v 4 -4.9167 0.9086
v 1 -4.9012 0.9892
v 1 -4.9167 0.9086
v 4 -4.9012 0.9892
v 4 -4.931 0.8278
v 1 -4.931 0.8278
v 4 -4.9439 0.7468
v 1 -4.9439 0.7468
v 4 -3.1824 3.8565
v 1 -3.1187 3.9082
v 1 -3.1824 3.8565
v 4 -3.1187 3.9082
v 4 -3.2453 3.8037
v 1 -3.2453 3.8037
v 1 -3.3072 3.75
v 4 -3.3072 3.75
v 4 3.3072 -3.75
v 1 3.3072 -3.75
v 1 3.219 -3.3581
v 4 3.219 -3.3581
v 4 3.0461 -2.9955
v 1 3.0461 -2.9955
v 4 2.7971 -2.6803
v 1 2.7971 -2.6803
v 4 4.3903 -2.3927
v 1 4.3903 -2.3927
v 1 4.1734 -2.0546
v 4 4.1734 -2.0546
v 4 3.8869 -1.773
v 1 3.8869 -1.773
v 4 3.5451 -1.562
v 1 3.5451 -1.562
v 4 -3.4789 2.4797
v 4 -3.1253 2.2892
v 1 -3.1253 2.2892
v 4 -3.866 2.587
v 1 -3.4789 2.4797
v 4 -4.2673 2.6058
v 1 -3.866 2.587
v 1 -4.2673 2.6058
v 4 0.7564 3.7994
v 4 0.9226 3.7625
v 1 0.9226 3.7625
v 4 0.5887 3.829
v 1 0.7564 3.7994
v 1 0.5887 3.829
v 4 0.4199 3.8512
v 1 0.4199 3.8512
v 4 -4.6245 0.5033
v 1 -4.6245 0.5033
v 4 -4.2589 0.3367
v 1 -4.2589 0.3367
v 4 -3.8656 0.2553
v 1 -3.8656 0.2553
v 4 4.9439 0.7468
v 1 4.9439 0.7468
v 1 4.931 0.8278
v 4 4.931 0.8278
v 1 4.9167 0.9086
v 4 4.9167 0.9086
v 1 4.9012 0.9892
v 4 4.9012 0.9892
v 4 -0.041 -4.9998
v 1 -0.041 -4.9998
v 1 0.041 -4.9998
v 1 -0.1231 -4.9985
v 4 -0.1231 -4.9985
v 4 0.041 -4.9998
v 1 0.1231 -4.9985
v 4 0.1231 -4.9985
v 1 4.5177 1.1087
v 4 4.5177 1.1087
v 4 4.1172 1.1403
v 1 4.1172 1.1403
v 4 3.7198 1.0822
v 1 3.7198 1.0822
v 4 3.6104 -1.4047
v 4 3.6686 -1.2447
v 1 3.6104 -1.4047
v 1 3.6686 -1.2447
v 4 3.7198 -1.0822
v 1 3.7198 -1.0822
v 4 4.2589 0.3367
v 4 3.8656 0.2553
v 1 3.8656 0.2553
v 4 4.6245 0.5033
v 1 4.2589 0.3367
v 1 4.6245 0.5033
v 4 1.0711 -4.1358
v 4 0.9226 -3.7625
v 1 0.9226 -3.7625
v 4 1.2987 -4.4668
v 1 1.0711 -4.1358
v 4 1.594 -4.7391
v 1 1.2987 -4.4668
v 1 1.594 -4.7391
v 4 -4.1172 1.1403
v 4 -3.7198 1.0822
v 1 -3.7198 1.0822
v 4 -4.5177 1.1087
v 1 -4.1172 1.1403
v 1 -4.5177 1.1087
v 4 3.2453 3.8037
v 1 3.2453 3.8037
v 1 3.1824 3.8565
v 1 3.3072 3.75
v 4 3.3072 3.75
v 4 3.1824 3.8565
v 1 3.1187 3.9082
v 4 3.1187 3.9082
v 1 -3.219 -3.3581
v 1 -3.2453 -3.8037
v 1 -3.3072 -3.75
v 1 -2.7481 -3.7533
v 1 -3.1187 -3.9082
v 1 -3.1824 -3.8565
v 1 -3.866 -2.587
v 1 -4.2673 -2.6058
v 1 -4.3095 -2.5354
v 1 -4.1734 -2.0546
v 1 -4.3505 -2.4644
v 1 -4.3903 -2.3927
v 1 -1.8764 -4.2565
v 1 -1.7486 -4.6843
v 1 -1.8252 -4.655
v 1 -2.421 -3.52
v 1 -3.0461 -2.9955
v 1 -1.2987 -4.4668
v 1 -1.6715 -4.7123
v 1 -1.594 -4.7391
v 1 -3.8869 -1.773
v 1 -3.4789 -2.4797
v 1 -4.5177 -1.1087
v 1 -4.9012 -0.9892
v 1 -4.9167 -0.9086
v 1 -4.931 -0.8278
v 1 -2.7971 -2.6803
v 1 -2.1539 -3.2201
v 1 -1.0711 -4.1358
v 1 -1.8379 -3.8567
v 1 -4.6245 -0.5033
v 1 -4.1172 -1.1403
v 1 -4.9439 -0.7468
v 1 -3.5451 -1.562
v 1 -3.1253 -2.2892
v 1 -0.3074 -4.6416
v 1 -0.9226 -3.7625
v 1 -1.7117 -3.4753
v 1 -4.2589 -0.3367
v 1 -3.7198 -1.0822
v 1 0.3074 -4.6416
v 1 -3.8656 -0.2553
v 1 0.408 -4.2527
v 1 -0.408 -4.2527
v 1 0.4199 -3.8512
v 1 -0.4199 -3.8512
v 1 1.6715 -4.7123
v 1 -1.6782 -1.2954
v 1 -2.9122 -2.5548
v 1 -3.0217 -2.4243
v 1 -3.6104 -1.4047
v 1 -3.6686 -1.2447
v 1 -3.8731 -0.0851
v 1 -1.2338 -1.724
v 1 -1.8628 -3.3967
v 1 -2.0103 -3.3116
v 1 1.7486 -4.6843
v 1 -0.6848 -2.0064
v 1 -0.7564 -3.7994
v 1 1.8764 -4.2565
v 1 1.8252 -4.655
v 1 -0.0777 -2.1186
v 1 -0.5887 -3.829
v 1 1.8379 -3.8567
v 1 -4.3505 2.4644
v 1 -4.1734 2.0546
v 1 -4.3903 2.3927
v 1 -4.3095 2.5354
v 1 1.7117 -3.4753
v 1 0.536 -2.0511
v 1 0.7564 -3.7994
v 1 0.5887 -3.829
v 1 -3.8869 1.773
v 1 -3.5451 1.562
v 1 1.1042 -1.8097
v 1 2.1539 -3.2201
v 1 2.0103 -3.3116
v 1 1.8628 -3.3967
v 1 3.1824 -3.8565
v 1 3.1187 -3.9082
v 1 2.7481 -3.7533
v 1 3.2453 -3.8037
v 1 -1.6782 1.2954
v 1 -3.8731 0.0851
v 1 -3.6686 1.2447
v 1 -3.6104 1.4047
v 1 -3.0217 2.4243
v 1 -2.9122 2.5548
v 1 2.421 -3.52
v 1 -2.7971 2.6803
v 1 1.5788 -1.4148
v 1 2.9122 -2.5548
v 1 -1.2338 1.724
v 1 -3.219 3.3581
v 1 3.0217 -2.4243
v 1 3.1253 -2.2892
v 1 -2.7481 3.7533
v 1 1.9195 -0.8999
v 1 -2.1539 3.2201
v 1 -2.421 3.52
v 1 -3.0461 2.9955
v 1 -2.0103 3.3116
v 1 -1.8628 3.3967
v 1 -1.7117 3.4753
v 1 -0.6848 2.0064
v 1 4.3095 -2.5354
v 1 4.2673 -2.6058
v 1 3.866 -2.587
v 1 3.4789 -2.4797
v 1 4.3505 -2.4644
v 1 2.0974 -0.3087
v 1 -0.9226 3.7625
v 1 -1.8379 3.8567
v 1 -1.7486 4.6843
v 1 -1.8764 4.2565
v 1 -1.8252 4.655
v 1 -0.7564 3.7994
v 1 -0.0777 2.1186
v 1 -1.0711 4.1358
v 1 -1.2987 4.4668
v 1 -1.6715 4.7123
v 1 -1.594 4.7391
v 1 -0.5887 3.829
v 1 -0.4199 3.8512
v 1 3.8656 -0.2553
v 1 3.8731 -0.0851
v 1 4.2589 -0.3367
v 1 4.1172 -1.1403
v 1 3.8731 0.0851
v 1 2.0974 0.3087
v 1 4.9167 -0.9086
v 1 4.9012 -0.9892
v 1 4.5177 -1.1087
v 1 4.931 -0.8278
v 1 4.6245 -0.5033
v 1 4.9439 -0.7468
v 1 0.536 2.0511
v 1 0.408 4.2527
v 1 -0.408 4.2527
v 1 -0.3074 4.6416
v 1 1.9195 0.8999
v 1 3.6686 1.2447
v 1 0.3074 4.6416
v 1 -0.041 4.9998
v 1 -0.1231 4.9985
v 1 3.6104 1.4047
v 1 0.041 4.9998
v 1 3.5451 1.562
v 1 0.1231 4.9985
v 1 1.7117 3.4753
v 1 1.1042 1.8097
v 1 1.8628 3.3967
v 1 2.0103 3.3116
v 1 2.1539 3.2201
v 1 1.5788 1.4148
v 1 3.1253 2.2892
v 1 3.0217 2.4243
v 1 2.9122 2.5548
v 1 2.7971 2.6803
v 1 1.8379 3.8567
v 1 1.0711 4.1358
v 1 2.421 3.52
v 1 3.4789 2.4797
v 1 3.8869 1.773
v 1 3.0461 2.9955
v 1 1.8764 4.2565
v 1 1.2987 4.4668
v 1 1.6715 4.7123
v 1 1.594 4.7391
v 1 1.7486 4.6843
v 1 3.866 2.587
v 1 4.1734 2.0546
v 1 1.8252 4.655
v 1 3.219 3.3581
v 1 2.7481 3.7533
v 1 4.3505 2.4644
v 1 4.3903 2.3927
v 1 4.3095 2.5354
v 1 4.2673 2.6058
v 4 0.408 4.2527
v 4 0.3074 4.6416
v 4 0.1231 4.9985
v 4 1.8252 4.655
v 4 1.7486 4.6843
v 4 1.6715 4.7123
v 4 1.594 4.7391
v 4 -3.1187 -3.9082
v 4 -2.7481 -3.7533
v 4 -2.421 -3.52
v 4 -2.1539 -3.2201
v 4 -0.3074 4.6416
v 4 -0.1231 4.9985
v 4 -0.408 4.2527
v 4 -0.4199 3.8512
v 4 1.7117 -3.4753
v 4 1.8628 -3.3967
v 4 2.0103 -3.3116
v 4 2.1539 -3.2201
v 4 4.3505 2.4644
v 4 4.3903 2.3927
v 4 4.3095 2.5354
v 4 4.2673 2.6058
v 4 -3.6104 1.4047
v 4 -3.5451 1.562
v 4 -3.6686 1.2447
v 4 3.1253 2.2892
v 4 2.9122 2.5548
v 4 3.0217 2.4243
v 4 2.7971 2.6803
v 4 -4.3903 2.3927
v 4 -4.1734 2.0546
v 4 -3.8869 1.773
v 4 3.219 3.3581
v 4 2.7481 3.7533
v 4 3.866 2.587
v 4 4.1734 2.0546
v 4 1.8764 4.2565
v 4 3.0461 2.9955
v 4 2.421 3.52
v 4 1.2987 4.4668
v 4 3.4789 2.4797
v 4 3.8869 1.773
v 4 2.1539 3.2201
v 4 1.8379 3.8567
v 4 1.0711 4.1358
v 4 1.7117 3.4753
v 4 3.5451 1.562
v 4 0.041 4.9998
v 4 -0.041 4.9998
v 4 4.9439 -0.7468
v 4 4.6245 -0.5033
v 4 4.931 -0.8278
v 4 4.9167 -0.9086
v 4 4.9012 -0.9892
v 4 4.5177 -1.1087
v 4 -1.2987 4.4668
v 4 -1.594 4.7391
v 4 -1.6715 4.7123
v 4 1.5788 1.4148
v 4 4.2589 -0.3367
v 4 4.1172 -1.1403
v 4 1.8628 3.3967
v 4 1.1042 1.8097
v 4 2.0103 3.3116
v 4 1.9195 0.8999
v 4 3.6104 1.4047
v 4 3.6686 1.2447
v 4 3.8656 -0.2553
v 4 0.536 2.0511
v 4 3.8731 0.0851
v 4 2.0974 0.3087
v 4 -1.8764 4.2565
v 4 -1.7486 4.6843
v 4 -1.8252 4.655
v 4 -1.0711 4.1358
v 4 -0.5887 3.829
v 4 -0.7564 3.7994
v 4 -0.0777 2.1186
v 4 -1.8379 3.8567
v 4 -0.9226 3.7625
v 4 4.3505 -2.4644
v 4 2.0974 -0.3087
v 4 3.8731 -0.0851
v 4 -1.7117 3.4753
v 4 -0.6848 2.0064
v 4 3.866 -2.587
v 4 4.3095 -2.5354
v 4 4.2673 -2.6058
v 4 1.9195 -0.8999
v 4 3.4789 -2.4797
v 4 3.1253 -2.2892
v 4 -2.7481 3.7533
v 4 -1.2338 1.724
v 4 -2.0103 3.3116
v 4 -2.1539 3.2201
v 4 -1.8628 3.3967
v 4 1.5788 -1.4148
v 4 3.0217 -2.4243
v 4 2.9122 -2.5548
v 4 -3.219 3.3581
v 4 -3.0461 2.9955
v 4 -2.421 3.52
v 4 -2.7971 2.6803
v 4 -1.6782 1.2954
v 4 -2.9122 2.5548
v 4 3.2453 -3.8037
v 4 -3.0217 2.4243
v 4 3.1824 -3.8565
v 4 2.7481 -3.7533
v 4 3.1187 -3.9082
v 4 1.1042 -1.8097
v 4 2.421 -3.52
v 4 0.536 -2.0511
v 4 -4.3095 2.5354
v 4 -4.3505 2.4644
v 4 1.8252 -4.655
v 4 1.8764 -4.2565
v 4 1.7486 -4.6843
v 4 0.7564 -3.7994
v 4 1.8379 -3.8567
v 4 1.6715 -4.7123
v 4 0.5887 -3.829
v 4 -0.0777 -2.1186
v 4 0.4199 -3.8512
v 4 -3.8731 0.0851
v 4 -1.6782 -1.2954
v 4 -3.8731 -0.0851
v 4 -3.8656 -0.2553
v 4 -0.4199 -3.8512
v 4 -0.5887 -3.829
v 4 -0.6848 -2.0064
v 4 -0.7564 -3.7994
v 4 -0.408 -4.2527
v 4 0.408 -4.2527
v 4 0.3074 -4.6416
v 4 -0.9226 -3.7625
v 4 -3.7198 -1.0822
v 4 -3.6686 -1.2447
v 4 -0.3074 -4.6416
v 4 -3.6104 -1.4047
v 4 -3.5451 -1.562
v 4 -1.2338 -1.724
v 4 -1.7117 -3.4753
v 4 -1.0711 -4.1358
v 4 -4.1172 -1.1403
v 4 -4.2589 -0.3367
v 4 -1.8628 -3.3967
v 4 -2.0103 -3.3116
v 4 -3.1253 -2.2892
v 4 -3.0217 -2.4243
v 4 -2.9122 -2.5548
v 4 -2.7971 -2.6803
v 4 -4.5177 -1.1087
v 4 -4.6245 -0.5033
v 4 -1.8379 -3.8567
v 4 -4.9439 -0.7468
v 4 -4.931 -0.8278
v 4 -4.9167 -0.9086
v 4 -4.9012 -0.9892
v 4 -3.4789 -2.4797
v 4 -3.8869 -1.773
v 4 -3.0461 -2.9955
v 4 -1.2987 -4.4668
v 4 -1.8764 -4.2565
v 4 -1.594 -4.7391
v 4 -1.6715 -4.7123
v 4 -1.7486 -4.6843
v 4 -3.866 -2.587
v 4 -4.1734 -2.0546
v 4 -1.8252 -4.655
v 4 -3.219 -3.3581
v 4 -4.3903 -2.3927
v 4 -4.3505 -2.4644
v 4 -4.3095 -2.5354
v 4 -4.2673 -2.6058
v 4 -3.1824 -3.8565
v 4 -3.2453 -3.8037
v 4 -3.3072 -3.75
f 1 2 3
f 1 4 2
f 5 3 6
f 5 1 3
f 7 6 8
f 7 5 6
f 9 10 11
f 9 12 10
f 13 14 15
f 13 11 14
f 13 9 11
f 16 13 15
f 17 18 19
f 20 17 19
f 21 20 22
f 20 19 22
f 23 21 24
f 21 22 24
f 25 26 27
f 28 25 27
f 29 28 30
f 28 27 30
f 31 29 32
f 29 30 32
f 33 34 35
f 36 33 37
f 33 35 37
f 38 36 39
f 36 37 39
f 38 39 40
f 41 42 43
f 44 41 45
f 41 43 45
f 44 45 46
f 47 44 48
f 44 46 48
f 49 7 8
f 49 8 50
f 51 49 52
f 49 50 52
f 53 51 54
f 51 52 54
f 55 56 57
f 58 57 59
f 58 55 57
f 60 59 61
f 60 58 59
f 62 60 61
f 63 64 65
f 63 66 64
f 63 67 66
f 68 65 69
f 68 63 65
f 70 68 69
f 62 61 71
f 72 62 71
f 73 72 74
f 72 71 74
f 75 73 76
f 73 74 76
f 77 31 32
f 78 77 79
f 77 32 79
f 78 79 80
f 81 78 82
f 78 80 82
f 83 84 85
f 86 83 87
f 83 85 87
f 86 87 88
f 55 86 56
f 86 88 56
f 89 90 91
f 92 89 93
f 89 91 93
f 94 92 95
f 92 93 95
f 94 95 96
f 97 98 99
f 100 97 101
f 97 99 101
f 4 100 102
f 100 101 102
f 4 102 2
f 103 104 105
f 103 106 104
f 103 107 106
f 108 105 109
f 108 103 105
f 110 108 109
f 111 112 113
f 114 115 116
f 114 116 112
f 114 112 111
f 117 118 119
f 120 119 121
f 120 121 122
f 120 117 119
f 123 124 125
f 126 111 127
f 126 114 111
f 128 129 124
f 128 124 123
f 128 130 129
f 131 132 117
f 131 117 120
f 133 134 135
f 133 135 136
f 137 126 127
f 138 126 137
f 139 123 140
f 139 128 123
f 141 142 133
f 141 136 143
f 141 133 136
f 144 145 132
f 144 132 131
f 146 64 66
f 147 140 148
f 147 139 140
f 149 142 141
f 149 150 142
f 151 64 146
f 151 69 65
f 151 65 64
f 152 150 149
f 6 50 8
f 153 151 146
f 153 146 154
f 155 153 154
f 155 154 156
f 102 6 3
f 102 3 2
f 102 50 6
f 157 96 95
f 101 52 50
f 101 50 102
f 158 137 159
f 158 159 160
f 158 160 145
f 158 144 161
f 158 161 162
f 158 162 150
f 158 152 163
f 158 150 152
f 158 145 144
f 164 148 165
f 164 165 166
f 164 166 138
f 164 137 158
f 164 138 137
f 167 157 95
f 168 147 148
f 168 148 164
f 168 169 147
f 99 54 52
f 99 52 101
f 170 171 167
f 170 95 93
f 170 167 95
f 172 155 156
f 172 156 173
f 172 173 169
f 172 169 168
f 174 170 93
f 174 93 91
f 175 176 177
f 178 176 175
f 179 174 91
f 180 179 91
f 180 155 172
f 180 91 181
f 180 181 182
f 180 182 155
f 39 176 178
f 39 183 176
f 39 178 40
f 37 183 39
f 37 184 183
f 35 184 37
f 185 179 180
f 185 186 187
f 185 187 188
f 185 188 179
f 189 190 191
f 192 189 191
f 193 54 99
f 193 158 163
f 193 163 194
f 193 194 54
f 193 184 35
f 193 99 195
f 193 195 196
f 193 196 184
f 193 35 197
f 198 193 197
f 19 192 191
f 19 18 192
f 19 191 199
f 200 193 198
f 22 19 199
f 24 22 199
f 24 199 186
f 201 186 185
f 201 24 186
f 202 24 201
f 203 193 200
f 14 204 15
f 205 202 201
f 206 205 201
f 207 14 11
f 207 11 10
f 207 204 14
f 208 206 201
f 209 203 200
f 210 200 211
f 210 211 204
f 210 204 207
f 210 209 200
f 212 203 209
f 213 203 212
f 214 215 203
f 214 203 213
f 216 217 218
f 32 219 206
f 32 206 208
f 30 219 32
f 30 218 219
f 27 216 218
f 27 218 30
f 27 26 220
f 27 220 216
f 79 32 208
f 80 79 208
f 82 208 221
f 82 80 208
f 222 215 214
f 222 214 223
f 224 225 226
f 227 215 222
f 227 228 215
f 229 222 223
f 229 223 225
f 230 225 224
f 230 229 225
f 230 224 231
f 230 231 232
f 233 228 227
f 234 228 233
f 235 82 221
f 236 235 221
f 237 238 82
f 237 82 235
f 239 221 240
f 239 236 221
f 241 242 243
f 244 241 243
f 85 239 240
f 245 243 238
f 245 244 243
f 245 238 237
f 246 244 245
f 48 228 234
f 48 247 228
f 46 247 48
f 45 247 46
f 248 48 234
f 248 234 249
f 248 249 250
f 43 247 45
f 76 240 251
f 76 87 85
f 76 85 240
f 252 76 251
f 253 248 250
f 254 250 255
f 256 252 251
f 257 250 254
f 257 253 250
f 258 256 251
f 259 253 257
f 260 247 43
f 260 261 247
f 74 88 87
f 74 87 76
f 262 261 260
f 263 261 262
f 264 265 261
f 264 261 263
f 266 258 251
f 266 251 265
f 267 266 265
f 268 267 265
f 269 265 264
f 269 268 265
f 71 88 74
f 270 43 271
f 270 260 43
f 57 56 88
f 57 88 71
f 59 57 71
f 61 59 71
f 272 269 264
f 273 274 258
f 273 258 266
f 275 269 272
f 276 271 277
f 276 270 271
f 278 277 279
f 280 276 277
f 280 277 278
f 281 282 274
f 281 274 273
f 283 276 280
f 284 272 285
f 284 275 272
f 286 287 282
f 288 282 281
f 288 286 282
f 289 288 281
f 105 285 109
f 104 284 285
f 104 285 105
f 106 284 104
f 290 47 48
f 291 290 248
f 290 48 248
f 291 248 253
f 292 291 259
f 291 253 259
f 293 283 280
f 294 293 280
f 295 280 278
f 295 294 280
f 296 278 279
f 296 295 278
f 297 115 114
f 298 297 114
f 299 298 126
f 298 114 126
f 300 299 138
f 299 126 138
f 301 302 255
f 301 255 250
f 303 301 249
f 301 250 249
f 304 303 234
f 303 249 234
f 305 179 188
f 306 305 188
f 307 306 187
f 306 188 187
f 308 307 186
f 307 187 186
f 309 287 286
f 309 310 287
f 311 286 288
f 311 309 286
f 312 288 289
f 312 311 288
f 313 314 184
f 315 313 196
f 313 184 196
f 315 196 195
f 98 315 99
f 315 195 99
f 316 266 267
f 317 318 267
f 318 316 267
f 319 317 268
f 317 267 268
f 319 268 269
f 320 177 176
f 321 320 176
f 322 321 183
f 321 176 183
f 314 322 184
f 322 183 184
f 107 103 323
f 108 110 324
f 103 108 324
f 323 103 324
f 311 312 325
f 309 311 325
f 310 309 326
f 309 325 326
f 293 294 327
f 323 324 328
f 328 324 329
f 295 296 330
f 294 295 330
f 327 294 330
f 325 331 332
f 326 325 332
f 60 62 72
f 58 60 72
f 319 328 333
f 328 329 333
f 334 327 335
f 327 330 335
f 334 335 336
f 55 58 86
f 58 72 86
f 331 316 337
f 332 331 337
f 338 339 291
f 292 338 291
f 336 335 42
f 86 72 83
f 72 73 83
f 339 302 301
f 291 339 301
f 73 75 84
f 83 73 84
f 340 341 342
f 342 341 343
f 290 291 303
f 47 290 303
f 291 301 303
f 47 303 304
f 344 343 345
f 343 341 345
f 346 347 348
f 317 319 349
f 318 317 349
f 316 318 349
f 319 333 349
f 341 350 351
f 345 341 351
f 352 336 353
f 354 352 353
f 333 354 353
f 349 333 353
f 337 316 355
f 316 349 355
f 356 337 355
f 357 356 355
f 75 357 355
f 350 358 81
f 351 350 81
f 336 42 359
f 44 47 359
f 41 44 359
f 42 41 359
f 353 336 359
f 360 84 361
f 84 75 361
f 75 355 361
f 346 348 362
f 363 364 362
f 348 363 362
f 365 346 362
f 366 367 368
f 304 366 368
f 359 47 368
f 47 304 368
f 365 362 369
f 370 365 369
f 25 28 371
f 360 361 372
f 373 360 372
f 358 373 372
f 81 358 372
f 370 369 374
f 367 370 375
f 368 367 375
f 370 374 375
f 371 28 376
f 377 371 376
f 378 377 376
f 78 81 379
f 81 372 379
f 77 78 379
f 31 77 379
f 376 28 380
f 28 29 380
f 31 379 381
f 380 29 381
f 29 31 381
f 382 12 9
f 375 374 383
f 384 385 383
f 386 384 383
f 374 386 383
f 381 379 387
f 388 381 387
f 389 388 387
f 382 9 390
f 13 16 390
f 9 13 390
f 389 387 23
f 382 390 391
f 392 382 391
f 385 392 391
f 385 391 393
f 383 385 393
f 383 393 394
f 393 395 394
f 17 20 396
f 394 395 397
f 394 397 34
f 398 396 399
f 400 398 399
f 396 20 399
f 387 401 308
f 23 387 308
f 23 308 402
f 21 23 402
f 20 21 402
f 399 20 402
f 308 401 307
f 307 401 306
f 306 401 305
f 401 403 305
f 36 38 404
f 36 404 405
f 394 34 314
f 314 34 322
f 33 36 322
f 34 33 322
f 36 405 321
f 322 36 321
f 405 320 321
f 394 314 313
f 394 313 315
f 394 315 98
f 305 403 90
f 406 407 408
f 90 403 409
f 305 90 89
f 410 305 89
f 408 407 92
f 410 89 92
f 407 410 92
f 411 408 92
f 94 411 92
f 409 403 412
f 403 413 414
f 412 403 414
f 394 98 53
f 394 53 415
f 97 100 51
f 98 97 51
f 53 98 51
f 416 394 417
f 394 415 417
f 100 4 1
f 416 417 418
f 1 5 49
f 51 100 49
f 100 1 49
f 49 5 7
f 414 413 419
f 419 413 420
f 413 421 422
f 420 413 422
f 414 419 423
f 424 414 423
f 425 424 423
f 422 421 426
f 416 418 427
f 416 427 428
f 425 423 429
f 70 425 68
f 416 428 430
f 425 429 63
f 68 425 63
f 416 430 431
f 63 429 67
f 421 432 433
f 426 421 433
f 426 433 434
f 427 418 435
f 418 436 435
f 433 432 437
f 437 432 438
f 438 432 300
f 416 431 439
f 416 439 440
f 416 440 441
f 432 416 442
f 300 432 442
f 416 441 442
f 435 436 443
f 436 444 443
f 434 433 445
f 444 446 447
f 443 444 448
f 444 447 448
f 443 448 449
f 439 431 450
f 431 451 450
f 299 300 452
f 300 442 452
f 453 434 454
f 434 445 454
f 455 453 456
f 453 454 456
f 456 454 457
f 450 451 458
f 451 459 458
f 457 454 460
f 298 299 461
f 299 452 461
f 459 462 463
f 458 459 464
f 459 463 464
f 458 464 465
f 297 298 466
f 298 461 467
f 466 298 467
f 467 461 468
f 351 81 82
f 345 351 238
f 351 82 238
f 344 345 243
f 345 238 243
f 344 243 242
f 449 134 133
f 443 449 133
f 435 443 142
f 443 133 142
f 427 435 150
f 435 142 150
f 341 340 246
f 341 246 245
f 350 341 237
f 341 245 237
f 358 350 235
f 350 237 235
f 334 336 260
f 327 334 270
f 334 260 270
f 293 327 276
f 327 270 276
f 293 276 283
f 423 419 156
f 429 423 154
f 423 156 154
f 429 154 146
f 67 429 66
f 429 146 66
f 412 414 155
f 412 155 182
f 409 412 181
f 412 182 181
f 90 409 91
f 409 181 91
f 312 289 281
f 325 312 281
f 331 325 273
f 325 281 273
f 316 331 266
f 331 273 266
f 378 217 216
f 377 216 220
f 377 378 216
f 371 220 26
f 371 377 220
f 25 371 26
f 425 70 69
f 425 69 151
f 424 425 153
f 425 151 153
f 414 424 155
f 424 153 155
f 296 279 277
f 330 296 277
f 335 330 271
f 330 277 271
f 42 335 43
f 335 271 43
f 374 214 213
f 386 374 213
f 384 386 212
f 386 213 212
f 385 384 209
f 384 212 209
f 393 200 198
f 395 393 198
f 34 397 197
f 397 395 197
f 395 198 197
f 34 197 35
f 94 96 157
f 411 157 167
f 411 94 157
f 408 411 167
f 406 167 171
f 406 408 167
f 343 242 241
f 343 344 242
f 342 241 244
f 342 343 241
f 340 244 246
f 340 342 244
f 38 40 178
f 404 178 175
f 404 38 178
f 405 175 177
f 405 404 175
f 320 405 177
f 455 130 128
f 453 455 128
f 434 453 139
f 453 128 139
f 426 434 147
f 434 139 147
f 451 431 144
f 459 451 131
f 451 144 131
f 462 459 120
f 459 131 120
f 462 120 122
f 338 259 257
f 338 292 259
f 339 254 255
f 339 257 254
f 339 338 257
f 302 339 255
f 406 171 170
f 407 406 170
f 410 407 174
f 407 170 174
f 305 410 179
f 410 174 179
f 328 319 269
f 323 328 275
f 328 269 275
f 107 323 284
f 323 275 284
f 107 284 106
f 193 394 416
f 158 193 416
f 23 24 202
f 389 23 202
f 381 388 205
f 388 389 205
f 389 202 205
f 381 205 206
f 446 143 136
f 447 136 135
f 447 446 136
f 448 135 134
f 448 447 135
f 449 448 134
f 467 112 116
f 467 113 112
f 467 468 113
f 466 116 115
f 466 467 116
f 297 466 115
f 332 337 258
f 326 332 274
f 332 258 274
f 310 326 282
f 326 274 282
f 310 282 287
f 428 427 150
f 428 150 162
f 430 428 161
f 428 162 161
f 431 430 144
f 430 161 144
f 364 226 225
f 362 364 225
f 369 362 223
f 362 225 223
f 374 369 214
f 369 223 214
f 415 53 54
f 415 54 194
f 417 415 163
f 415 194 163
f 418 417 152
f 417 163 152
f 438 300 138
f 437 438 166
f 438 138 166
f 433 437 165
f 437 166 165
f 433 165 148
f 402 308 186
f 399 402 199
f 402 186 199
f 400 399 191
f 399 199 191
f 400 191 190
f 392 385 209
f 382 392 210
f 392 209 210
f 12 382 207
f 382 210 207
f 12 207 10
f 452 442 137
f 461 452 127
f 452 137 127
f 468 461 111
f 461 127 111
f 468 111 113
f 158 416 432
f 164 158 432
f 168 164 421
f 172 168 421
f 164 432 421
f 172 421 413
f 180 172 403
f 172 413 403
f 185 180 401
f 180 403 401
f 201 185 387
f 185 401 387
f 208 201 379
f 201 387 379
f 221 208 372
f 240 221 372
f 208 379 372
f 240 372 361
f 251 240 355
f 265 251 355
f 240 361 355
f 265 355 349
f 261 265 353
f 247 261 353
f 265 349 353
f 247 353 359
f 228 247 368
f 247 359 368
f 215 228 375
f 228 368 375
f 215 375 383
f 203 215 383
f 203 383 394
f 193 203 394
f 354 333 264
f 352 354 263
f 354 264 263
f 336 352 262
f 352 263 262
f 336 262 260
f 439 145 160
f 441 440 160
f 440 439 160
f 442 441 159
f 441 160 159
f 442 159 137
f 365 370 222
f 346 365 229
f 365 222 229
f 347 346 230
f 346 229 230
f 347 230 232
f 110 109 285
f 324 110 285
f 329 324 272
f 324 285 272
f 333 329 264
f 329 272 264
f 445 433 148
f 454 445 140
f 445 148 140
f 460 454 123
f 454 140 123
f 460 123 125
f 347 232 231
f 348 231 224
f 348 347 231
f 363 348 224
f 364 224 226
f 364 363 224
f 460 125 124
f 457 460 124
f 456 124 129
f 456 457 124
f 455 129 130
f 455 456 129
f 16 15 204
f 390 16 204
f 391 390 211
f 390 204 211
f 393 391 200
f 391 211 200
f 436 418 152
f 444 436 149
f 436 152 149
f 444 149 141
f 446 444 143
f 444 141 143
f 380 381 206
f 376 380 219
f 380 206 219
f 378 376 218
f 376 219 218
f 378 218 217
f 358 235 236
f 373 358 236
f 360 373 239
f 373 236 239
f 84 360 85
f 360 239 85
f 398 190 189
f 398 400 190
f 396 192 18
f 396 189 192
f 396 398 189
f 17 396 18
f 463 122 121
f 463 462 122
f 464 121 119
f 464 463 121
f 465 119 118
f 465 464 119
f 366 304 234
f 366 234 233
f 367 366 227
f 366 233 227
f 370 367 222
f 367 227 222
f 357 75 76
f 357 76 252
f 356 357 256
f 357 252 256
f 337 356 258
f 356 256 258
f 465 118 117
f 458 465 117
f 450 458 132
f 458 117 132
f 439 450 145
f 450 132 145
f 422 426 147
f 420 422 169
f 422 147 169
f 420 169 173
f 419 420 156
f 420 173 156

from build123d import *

# Parameters (mm, degrees)
BASPROSKE_W        = 4
BASPROSKE_H        = 5
TOOTHCUT_DEPTH     = 9.124038405
TEETHCUTS_COUNT    = 18
TEETHCUTS_ANGLE    = 340
BORE_DEPTH         = 50.0000508
CUT_EXTRUDE1_DEPTH = 1


with BuildPart() as part:
    # BasProSke → Base-Revolve (revolve)
    with BuildSketch(Plane(origin=(0, 0, 0), x_dir=(1, 0, 0), z_dir=(0, 1, 0)), mode=Mode.PRIVATE) as base_revolve_sk:
        with Locations((2, 2.5)):
            Rectangle(BASPROSKE_W, BASPROSKE_H)
    revolve(base_revolve_sk.sketch.rotate(Axis((-10, 0, 0), (1, 0, 0)), 180), axis=Axis((-10, 0, 0), (1, 0, 0)))

    # TooCutSke → ToothCut (cut, through all)
    with BuildSketch(Plane(origin=(0, 0, 0), x_dir=(0, 0, -1), z_dir=(1, 0, 0))):
        with BuildLine():
            ThreePointArc((0.25527463, 3.865580275), (0, 3.874), (-0.25527463, 3.865580275))
            ThreePointArc((-0.25527463, 3.865580275), (-0.416281865, 4.46052923), (-0.768562654, 4.96628197))
            ThreePointArc((-0.768562654, 4.96628197), (0, 5.0254), (0.768562654, 4.96628197))
            ThreePointArc((0.768562654, 4.96628197), (0.416281865, 4.46052923), (0.25527463, 3.865580275))
        make_face()
    toothcut = extrude(amount=TOOTHCUT_DEPTH, mode=Mode.SUBTRACT)

    # TeethCuts: ToothCut ×18 about axis
    teethcuts_axis = Axis((-10, 0, 0), (1, 0, 0))
    for i in range(1, TEETHCUTS_COUNT):
        add(toothcut.rotate(teethcuts_axis, i * TEETHCUTS_ANGLE / (TEETHCUTS_COUNT - 1)), mode=Mode.SUBTRACT)

    # BorSke → Bore (cut, symmetric)
    with BuildSketch(Plane(origin=(0, 0, 0), x_dir=(0, 0, -1), z_dir=(1, 0, 0))):
        with BuildLine():
            Line((-1.295364774, -1.678222304), (1.295364774, -1.678222304))
            ThreePointArc((1.295364774, -1.678222304), (0, 2.12), (-1.295364774, -1.678222304))
        make_face()
    extrude(amount=BORE_DEPTH, both=True, mode=Mode.SUBTRACT)

    # Sketch1 → Cut-Extrude1 (cut)
    with BuildSketch(Plane.ZY):
        with BuildLine():
            ThreePointArc((3.220053404, 2.153864452), (3.645784857, 2.578031095), (3.908157867, 3.118701988))
            ThreePointArc((3.908157867, 3.118701988), (3.830222216, 3.213938048), (3.749966389, 3.30722725))
            ThreePointArc((3.749966389, 3.30722725), (3.171948906, 3.142726791), (2.680298817, 2.79711892))
            ThreePointArc((2.680298817, 2.79711892), (2.4901592, 2.967656173), (2.289195394, 3.125293658))
            ThreePointArc((2.289195394, 3.125293658), (2.544178562, 3.669488655), (2.605808207, 4.267289958))
            ThreePointArc((2.605808207, 4.267289958), (2.5, 4.330127019), (2.392677406, 4.390341084))
            ThreePointArc((2.392677406, 4.390341084), (1.905781113, 4.038067594), (1.561986006, 3.545148194))
            ThreePointArc((1.561986006, 3.545148194), (1.324986035, 3.640369213), (1.082226634, 3.719766325))
            ThreePointArc((1.082226634, 3.719766325), (1.135706785, 4.318351728), (0.98915962, 4.901179781))
            ThreePointArc((0.98915962, 4.901179781), (0.868240888, 4.924038765), (0.746796215, 4.943914988))
            ThreePointArc((0.746796215, 4.943914988), (0.409747992, 4.44635785), (0.25527463, 3.865580275))
            ThreePointArc((0.25527463, 3.865580275), (0, 3.874), (-0.25527463, 3.865580275))
            ThreePointArc((-0.25527463, 3.865580275), (-0.409747992, 4.44635785), (-0.746796215, 4.943914988))
            ThreePointArc((-0.746796215, 4.943914988), (-0.868240888, 4.924038765), (-0.98915962, 4.901179781))
            ThreePointArc((-0.98915962, 4.901179781), (-1.135706785, 4.318351728), (-1.082226634, 3.719766325))
            ThreePointArc((-1.082226634, 3.719766325), (-1.324986035, 3.640369213), (-1.561986006, 3.545148194))
            ThreePointArc((-1.561986006, 3.545148194), (-1.905781113, 4.038067594), (-2.392677406, 4.390341084))
            ThreePointArc((-2.392677406, 4.390341084), (-2.5, 4.330127019), (-2.605808207, 4.267289958))
            ThreePointArc((-2.605808207, 4.267289958), (-2.544178562, 3.669488655), (-2.289195394, 3.125293658))
            ThreePointArc((-2.289195394, 3.125293658), (-2.4901592, 2.967656173), (-2.680298817, 2.79711892))
            ThreePointArc((-2.680298817, 2.79711892), (-3.171948906, 3.142726791), (-3.749966389, 3.30722725))
            ThreePointArc((-3.749966389, 3.30722725), (-3.830222216, 3.213938048), (-3.908157867, 3.118701988))
            ThreePointArc((-3.908157867, 3.118701988), (-3.645784857, 2.578031095), (-3.220053404, 2.153864452))
            ThreePointArc((-3.220053404, 2.153864452), (-3.354982414, 1.937), (-3.475328033, 1.711715823))
            ThreePointArc((-3.475328033, 1.711715823), (-4.055532848, 1.868326755), (-4.654954082, 1.825213))
            ThreePointArc((-4.654954082, 1.825213), (-4.698463104, 1.710100717), (-4.739126009, 1.593952531))
            ThreePointArc((-4.739126009, 1.593952531), (-4.307655691, 1.175624937), (-3.762525451, 0.922647405))
            ThreePointArc((-3.762525451, 0.922647405), (-3.815145235, 0.67271304), (-3.851181399, 0.419854536))
            ThreePointArc((-3.851181399, 0.419854536), (-4.449959675, 0.368578939), (-4.998485613, 0.123051126))
            ThreePointArc((-4.998485613, 0.123051126), (-5, 0), (-4.998485613, -0.123051126))
            ThreePointArc((-4.998485613, -0.123051126), (-4.449959675, -0.368578939), (-3.851181399, -0.419854536))
            ThreePointArc((-3.851181399, -0.419854536), (-3.815145235, -0.67271304), (-3.762525451, -0.922647405))
            ThreePointArc((-3.762525451, -0.922647405), (-4.307655691, -1.175624937), (-4.739126009, -1.593952531))
            ThreePointArc((-4.739126009, -1.593952531), (-4.698463104, -1.710100717), (-4.654954082, -1.825213))
            ThreePointArc((-4.654954082, -1.825213), (-4.055532848, -1.868326755), (-3.475328033, -1.711715823))
            ThreePointArc((-3.475328033, -1.711715823), (-3.354982414, -1.937), (-3.220053404, -2.153864452))
            ThreePointArc((-3.220053404, -2.153864452), (-3.645784857, -2.578031095), (-3.908157867, -3.118701988))
            ThreePointArc((-3.908157867, -3.118701988), (-3.830222216, -3.213938048), (-3.749966389, -3.30722725))
            ThreePointArc((-3.749966389, -3.30722725), (-3.171948906, -3.142726791), (-2.680298817, -2.79711892))
            ThreePointArc((-2.680298817, -2.79711892), (-2.4901592, -2.967656173), (-2.289195394, -3.125293658))
            ThreePointArc((-2.289195394, -3.125293658), (-2.544178562, -3.669488655), (-2.605808207, -4.267289958))
            ThreePointArc((-2.605808207, -4.267289958), (-2.5, -4.330127019), (-2.392677406, -4.390341084))
            ThreePointArc((-2.392677406, -4.390341084), (-1.905781113, -4.038067594), (-1.561986006, -3.545148194))
            ThreePointArc((-1.561986006, -3.545148194), (-1.324986035, -3.640369213), (-1.082226634, -3.719766325))
            ThreePointArc((-1.082226634, -3.719766325), (-1.135706785, -4.318351728), (-0.98915962, -4.901179781))
            ThreePointArc((-0.98915962, -4.901179781), (-0.868240888, -4.924038765), (-0.746796215, -4.943914988))
            ThreePointArc((-0.746796215, -4.943914988), (-0.409747992, -4.44635785), (-0.25527463, -3.865580275))
            ThreePointArc((-0.25527463, -3.865580275), (0, -3.874), (0.25527463, -3.865580275))
            ThreePointArc((0.25527463, -3.865580275), (0.409747992, -4.44635785), (0.746796215, -4.943914988))
            ThreePointArc((0.746796215, -4.943914988), (0.868240888, -4.924038765), (0.98915962, -4.901179781))
            ThreePointArc((0.98915962, -4.901179781), (1.135706785, -4.318351728), (1.082226634, -3.719766325))
            ThreePointArc((1.082226634, -3.719766325), (1.324986035, -3.640369213), (1.561986006, -3.545148194))
            ThreePointArc((1.561986006, -3.545148194), (1.905781113, -4.038067594), (2.392677406, -4.390341084))
            ThreePointArc((2.392677406, -4.390341084), (2.5, -4.330127019), (2.605808207, -4.267289958))
            ThreePointArc((2.605808207, -4.267289958), (2.544178562, -3.669488655), (2.289195394, -3.125293658))
            ThreePointArc((2.289195394, -3.125293658), (2.4901592, -2.967656173), (2.680298817, -2.79711892))
            ThreePointArc((2.680298817, -2.79711892), (3.171948906, -3.142726791), (3.749966389, -3.30722725))
            ThreePointArc((3.749966389, -3.30722725), (3.830222216, -3.213938048), (3.908157867, -3.118701988))
            ThreePointArc((3.908157867, -3.118701988), (3.645784857, -2.578031095), (3.220053404, -2.153864452))
            ThreePointArc((3.220053404, -2.153864452), (3.354982414, -1.937), (3.475328033, -1.711715823))
            ThreePointArc((3.475328033, -1.711715823), (4.055532848, -1.868326755), (4.654954082, -1.825213))
            ThreePointArc((4.654954082, -1.825213), (4.698463104, -1.710100717), (4.739126009, -1.593952531))
            ThreePointArc((4.739126009, -1.593952531), (4.307655691, -1.175624937), (3.762525451, -0.922647405))
            ThreePointArc((3.762525451, -0.922647405), (3.815145235, -0.67271304), (3.851181399, -0.419854536))
            ThreePointArc((3.851181399, -0.419854536), (4.449959675, -0.368578939), (4.998485613, -0.123051126))
            ThreePointArc((4.998485613, -0.123051126), (5, 0), (4.998485613, 0.123051126))
            ThreePointArc((4.998485613, 0.123051126), (4.449959675, 0.368578939), (3.851181399, 0.419854536))
            ThreePointArc((3.851181399, 0.419854536), (3.815145235, 0.67271304), (3.762525451, 0.922647405))
            ThreePointArc((3.762525451, 0.922647405), (4.307655691, 1.175624937), (4.739126009, 1.593952531))
            ThreePointArc((4.739126009, 1.593952531), (4.698463104, 1.710100717), (4.654954082, 1.825213))
            ThreePointArc((4.654954082, 1.825213), (4.055532848, 1.868326755), (3.475328033, 1.711715823))
            ThreePointArc((3.475328033, 1.711715823), (3.354982414, 1.937), (3.220053404, 2.153864452))
        make_face()
    extrude(amount=-CUT_EXTRUDE1_DEPTH, mode=Mode.SUBTRACT)


solid = part.part
